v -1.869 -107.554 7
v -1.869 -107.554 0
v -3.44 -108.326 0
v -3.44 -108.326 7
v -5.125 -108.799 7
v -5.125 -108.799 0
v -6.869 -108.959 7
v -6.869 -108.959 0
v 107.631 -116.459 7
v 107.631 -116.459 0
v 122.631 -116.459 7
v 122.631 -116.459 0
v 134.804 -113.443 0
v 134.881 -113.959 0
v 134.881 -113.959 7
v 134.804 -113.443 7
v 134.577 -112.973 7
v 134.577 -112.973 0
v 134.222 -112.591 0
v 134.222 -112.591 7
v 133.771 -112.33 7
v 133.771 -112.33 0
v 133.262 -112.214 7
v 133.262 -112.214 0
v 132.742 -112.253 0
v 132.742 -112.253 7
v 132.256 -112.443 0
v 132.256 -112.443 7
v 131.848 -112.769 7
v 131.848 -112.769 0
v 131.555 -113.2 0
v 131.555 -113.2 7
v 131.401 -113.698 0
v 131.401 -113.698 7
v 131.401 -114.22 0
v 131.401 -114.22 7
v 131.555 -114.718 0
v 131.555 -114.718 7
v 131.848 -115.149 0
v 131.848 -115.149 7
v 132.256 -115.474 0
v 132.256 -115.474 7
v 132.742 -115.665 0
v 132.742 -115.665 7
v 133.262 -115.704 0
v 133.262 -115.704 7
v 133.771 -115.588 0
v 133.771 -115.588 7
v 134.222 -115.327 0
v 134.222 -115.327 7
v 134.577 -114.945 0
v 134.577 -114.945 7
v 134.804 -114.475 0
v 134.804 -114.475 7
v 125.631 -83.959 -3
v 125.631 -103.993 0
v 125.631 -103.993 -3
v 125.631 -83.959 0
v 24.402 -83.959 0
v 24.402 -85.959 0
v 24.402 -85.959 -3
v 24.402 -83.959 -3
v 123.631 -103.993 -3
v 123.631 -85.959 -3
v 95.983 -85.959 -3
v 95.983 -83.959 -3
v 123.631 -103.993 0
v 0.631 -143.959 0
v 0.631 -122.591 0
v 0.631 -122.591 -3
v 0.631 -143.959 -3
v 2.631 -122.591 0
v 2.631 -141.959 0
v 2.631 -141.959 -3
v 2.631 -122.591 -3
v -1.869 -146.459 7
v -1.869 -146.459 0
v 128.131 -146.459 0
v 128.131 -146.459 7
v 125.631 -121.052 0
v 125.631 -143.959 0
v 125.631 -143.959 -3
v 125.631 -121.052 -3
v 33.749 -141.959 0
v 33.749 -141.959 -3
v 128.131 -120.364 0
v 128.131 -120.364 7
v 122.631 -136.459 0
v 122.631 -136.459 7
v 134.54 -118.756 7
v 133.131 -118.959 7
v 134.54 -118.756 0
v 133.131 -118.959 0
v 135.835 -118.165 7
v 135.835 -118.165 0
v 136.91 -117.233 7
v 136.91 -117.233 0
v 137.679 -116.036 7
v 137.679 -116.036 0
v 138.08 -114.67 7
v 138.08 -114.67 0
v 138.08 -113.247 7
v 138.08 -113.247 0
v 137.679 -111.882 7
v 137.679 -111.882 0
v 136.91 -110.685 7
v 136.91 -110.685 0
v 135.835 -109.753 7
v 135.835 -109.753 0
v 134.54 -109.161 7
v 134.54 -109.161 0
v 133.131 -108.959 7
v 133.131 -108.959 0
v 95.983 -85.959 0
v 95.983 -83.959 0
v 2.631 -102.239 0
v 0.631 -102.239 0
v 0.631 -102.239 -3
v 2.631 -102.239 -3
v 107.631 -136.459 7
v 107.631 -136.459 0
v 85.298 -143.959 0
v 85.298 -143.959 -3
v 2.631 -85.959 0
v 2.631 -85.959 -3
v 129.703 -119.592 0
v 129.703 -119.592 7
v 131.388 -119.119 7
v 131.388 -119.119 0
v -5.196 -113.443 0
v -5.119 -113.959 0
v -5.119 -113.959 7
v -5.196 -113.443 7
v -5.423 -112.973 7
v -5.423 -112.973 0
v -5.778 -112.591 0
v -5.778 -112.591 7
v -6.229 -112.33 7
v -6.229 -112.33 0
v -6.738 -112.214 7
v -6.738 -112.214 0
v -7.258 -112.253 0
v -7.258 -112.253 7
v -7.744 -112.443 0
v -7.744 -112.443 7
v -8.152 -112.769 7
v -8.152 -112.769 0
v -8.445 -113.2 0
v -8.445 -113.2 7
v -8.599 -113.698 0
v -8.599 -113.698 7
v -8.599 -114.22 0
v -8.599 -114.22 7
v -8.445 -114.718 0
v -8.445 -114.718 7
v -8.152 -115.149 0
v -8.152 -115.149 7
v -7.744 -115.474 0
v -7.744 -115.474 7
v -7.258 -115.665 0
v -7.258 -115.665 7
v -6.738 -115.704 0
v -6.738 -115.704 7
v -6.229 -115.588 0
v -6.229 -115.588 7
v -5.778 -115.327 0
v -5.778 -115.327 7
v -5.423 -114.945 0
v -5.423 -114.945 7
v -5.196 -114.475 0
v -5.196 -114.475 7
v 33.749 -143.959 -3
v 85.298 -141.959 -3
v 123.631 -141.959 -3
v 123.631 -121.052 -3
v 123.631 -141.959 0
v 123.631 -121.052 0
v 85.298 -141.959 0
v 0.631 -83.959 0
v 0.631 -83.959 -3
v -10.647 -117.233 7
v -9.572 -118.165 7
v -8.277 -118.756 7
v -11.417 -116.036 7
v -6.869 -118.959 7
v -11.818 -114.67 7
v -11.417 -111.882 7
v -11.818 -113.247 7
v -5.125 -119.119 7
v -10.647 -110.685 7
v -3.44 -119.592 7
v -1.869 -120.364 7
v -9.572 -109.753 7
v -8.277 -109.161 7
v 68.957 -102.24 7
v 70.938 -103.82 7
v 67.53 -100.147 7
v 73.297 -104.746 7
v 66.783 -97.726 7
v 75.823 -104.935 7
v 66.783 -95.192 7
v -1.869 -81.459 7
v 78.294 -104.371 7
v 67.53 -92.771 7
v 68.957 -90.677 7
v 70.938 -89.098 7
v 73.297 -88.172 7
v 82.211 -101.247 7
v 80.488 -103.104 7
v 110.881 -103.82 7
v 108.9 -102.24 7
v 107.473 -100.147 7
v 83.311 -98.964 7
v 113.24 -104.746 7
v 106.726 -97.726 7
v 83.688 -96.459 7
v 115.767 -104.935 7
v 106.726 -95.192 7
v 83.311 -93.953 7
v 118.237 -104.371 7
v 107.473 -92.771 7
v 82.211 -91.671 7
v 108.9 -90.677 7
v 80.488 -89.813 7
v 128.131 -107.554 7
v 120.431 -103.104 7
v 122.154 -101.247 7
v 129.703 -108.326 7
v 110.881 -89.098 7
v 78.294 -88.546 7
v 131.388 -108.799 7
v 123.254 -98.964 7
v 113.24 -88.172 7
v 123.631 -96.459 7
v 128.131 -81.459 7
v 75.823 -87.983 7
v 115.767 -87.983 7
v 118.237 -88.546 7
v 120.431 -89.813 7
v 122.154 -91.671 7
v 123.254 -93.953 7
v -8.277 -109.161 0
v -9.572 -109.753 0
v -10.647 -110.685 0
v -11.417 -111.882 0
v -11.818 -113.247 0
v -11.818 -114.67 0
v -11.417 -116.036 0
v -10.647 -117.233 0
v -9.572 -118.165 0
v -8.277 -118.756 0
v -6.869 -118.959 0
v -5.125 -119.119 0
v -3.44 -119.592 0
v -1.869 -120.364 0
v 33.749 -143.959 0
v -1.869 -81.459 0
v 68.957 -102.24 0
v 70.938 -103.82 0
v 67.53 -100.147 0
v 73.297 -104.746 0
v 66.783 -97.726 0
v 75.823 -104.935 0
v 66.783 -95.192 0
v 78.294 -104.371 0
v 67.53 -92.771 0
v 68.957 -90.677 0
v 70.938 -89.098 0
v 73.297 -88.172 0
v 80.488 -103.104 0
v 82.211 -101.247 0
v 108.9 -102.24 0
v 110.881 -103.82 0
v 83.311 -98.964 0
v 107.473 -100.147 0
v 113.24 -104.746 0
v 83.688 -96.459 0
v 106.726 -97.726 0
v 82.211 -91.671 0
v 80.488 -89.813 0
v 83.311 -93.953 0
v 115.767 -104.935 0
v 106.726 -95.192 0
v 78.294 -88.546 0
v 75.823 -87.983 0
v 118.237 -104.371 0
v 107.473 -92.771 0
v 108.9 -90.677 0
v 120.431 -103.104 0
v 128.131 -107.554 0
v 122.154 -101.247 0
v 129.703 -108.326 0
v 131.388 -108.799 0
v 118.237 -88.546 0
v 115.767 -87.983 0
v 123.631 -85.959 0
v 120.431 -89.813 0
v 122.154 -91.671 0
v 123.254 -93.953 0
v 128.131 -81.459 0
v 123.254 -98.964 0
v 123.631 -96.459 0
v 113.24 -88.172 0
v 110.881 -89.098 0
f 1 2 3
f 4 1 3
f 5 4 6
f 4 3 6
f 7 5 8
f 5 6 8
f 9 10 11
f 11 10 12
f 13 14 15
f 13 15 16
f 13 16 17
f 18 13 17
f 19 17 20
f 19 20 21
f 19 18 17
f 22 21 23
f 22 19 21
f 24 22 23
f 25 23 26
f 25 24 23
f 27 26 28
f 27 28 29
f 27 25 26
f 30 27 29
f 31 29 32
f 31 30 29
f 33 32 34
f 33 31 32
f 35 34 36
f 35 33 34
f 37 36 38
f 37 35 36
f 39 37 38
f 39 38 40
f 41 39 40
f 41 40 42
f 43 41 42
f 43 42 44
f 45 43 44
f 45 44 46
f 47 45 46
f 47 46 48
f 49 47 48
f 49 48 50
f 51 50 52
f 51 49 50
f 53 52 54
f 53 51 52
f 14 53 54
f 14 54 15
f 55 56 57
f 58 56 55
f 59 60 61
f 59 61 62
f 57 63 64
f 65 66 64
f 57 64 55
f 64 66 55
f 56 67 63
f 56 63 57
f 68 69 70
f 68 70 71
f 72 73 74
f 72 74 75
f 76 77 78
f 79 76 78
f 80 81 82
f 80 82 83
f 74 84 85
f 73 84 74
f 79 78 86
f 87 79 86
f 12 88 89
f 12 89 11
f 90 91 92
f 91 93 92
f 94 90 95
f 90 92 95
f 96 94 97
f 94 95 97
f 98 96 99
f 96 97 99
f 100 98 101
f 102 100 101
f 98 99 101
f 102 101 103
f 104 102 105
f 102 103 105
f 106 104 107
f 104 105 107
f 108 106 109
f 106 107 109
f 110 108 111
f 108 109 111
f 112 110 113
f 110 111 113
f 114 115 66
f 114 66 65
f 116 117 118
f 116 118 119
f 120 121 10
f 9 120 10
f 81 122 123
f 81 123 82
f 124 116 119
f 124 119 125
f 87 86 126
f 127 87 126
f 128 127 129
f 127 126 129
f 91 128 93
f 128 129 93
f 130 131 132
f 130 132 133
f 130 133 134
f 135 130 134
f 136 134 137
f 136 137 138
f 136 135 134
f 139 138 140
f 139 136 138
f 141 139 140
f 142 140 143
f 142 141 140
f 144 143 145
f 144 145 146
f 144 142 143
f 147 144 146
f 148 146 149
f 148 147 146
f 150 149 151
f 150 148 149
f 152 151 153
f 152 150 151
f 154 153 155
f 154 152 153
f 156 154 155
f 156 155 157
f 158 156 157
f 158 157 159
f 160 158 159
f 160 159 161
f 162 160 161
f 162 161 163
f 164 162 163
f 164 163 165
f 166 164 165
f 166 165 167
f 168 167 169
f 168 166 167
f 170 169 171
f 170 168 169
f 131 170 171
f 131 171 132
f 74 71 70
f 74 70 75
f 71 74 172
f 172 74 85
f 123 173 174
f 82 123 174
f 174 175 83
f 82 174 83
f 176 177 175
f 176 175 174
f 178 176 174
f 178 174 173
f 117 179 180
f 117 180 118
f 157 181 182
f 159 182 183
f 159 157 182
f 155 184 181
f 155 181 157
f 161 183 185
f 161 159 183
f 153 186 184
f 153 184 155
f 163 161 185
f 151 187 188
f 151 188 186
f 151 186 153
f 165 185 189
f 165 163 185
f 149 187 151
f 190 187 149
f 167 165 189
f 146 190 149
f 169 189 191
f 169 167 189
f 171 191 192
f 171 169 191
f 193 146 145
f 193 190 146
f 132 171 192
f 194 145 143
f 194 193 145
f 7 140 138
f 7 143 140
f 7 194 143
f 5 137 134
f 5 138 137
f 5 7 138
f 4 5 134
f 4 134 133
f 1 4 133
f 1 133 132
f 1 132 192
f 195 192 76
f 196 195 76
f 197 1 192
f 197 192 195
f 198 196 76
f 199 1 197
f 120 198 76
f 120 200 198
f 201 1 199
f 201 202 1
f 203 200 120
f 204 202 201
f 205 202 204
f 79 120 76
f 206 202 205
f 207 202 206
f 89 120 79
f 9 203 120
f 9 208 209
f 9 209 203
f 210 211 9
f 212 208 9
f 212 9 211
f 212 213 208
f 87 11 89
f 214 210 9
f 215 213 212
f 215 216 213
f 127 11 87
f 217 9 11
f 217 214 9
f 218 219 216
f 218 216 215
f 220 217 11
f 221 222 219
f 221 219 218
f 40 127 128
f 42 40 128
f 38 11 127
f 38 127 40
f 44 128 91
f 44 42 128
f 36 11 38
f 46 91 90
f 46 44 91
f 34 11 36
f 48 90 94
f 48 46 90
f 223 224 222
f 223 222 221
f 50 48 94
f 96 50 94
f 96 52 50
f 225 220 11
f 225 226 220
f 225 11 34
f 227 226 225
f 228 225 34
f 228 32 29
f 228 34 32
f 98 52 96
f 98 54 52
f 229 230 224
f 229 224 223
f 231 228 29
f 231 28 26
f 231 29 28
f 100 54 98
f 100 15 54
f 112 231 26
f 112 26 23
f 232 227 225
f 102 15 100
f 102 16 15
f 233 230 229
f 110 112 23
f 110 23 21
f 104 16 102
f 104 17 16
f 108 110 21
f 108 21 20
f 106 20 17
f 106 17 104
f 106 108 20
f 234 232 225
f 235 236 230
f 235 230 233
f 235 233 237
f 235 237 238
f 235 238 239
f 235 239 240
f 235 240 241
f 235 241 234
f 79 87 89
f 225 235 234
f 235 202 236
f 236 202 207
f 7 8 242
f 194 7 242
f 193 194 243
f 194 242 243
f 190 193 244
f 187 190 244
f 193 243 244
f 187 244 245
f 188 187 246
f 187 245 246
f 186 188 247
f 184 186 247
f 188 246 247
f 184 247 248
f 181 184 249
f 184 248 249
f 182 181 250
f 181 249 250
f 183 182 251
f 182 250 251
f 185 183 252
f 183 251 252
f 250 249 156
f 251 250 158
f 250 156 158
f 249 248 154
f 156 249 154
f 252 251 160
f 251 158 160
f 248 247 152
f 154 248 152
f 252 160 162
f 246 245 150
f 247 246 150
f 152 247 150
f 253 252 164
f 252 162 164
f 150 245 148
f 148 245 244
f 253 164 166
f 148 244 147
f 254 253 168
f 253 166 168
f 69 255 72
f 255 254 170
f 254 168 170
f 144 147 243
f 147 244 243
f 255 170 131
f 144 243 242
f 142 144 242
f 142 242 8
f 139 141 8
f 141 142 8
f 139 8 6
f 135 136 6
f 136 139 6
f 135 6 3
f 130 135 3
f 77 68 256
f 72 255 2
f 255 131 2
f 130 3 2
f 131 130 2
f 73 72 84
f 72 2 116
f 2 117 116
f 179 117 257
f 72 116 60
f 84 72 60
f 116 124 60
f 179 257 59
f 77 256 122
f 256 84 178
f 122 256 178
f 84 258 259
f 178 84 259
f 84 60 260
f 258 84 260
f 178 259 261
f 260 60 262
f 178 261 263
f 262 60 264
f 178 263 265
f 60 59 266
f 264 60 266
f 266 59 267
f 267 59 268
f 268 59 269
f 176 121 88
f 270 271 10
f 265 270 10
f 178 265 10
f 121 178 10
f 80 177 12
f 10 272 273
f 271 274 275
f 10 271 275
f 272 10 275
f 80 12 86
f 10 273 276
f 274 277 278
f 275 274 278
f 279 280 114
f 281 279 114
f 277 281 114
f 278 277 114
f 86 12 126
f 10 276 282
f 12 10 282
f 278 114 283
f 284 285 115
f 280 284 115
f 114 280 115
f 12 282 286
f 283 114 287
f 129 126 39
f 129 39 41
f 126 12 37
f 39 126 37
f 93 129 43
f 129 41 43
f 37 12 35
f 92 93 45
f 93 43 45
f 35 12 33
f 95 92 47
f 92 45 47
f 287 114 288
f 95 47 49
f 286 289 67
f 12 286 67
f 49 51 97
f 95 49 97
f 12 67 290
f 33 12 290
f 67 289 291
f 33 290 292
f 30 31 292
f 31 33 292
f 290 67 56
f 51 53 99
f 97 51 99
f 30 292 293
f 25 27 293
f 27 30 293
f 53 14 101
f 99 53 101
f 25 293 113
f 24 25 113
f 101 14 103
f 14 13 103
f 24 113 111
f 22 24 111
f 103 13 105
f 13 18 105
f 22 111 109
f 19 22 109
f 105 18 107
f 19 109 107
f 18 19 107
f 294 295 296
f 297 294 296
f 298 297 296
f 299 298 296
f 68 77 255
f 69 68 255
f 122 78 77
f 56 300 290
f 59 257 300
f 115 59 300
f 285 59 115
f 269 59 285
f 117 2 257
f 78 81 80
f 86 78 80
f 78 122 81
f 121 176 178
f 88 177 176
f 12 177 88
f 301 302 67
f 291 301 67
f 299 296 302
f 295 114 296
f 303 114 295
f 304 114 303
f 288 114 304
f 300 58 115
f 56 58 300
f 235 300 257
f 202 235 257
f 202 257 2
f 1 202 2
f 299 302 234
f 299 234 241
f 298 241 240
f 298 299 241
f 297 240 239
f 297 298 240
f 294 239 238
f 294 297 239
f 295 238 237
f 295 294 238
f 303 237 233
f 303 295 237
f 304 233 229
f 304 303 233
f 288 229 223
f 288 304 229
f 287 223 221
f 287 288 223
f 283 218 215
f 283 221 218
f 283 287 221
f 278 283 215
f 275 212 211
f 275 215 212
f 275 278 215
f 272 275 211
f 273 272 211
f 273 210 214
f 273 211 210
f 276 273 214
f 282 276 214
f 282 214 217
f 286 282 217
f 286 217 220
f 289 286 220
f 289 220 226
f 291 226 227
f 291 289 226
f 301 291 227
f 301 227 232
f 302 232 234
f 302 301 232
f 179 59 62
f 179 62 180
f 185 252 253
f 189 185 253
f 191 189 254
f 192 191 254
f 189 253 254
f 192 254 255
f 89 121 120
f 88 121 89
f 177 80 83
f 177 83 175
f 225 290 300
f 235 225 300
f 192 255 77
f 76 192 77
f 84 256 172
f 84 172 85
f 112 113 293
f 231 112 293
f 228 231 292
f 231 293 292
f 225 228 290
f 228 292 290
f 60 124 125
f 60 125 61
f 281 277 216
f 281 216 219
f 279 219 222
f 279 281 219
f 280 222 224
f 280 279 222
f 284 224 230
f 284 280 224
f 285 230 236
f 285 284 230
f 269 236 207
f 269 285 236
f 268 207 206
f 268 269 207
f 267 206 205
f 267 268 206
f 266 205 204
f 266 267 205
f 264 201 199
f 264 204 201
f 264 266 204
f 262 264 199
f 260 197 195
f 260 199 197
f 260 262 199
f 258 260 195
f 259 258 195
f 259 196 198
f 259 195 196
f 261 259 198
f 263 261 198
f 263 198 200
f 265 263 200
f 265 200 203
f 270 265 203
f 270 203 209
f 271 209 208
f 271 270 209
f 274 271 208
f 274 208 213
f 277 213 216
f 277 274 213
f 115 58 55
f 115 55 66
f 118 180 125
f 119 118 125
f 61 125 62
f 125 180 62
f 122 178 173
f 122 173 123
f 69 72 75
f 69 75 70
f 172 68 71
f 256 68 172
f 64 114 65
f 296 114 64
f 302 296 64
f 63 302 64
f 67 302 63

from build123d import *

# Parameters (mm, degrees)
SKETCH1_R               = 1.75
BOSS_EXTRUDE1_DEPTH     = 7
BOSS_EXTRUDE3_DEPTH     = 3
CUT_EXTRUDE1_DEPTH      = 18
CUT_EXTRUDE1_DEPTH_BACK = 23
SKETCH2_R               = 8.5
SKETCH2_W               = 15
SKETCH2_H               = 20


with BuildPart() as part:
    # Sketch1 → Boss-Extrude1 (new body)
    with BuildSketch(Plane.XY):
        with BuildLine():
            Line((128.131337811, -146.458879214), (128.131337811, -120.364170926))
            ThreePointArc((128.131337811, -120.364170926), (130.534472162, -119.316879015), (133.131337811, -118.958879214))
            ThreePointArc((133.131337811, -118.958879214), (138.131337811, -113.958879214), (133.131337811, -108.958879214))
            ThreePointArc((133.131337811, -108.958879214), (130.534472162, -108.600879413), (128.131337811, -107.553587502))
            Line((128.131337811, -107.553587502), (128.131337811, -81.458879214))
            Line((128.131337811, -81.458879214), (-1.868662189, -81.458879214))
            Line((-1.868662189, -81.458879214), (-1.868662189, -107.553587502))
            ThreePointArc((-1.868662189, -107.553587502), (-4.27179654, -108.600879413), (-6.868662189, -108.958879214))
            ThreePointArc((-6.868662189, -108.958879214), (-11.868662189, -113.958879214), (-6.868662189, -118.958879214))
            ThreePointArc((-6.868662189, -118.958879214), (-4.27179654, -119.316879015), (-1.868662189, -120.364170926))
            Line((-1.868662189, -120.364170926), (-1.868662189, -146.458879214))
            Line((-1.868662189, -146.458879214), (128.131337811, -146.458879214))
        make_face()
        with Locations((133.131337811, -113.958879214)):
            Circle(SKETCH1_R, mode=Mode.SUBTRACT)
        with Locations((-6.868662189, -113.958879214)):
            Circle(SKETCH1_R, mode=Mode.SUBTRACT)
    extrude(amount=BOSS_EXTRUDE1_DEPTH)

    # Sketch1<4> → Boss-Extrude3 (add)
    with BuildSketch(Plane.XY):
        Polygon((125.631337811, -143.958879214), (125.631337811, -121.052392275), (123.631337811, -121.052392275), (123.631337811, -141.958879214), (85.298090445, -141.958879214), (85.298090445, -143.958879214), align=None)
        Polygon((123.631337811, -103.992549868), (125.631337811, -103.992549868), (125.631337811, -83.958879214), (95.983128658, -83.958879214), (95.983128658, -85.958879214), (123.631337811, -85.958879214), align=None)
        Polygon((0.631337811, -143.958879214), (33.749338975, -143.958879214), (33.749338975, -141.958879214), (2.631337811, -141.958879214), (2.631337811, -122.590614977), (0.631337811, -122.590614977), align=None)
        Polygon((24.401857146, -85.958879214), (24.401857146, -83.958879214), (0.631337811, -83.958879214), (0.631337811, -102.239135551), (2.631337811, -102.239135551), (2.631337811, -85.958879214), align=None)
    extrude(amount=-BOSS_EXTRUDE3_DEPTH)

    # Sketch2 → Cut-Extrude1 (cut, two sides: drawn at the far end of the back side and taken through both)
    with BuildSketch(Plane.XY.offset(7).offset(-CUT_EXTRUDE1_DEPTH_BACK)):
        with Locations((115.131337811, -96.458879214)):
            Circle(SKETCH2_R)
        with Locations((75.188241038, -96.458879214)):
            Circle(SKETCH2_R)
        with Locations((115.131337811, -126.458879214)):
            Rectangle(SKETCH2_W, SKETCH2_H)
    extrude(amount=CUT_EXTRUDE1_DEPTH + CUT_EXTRUDE1_DEPTH_BACK, mode=Mode.SUBTRACT)


solid = part.part
